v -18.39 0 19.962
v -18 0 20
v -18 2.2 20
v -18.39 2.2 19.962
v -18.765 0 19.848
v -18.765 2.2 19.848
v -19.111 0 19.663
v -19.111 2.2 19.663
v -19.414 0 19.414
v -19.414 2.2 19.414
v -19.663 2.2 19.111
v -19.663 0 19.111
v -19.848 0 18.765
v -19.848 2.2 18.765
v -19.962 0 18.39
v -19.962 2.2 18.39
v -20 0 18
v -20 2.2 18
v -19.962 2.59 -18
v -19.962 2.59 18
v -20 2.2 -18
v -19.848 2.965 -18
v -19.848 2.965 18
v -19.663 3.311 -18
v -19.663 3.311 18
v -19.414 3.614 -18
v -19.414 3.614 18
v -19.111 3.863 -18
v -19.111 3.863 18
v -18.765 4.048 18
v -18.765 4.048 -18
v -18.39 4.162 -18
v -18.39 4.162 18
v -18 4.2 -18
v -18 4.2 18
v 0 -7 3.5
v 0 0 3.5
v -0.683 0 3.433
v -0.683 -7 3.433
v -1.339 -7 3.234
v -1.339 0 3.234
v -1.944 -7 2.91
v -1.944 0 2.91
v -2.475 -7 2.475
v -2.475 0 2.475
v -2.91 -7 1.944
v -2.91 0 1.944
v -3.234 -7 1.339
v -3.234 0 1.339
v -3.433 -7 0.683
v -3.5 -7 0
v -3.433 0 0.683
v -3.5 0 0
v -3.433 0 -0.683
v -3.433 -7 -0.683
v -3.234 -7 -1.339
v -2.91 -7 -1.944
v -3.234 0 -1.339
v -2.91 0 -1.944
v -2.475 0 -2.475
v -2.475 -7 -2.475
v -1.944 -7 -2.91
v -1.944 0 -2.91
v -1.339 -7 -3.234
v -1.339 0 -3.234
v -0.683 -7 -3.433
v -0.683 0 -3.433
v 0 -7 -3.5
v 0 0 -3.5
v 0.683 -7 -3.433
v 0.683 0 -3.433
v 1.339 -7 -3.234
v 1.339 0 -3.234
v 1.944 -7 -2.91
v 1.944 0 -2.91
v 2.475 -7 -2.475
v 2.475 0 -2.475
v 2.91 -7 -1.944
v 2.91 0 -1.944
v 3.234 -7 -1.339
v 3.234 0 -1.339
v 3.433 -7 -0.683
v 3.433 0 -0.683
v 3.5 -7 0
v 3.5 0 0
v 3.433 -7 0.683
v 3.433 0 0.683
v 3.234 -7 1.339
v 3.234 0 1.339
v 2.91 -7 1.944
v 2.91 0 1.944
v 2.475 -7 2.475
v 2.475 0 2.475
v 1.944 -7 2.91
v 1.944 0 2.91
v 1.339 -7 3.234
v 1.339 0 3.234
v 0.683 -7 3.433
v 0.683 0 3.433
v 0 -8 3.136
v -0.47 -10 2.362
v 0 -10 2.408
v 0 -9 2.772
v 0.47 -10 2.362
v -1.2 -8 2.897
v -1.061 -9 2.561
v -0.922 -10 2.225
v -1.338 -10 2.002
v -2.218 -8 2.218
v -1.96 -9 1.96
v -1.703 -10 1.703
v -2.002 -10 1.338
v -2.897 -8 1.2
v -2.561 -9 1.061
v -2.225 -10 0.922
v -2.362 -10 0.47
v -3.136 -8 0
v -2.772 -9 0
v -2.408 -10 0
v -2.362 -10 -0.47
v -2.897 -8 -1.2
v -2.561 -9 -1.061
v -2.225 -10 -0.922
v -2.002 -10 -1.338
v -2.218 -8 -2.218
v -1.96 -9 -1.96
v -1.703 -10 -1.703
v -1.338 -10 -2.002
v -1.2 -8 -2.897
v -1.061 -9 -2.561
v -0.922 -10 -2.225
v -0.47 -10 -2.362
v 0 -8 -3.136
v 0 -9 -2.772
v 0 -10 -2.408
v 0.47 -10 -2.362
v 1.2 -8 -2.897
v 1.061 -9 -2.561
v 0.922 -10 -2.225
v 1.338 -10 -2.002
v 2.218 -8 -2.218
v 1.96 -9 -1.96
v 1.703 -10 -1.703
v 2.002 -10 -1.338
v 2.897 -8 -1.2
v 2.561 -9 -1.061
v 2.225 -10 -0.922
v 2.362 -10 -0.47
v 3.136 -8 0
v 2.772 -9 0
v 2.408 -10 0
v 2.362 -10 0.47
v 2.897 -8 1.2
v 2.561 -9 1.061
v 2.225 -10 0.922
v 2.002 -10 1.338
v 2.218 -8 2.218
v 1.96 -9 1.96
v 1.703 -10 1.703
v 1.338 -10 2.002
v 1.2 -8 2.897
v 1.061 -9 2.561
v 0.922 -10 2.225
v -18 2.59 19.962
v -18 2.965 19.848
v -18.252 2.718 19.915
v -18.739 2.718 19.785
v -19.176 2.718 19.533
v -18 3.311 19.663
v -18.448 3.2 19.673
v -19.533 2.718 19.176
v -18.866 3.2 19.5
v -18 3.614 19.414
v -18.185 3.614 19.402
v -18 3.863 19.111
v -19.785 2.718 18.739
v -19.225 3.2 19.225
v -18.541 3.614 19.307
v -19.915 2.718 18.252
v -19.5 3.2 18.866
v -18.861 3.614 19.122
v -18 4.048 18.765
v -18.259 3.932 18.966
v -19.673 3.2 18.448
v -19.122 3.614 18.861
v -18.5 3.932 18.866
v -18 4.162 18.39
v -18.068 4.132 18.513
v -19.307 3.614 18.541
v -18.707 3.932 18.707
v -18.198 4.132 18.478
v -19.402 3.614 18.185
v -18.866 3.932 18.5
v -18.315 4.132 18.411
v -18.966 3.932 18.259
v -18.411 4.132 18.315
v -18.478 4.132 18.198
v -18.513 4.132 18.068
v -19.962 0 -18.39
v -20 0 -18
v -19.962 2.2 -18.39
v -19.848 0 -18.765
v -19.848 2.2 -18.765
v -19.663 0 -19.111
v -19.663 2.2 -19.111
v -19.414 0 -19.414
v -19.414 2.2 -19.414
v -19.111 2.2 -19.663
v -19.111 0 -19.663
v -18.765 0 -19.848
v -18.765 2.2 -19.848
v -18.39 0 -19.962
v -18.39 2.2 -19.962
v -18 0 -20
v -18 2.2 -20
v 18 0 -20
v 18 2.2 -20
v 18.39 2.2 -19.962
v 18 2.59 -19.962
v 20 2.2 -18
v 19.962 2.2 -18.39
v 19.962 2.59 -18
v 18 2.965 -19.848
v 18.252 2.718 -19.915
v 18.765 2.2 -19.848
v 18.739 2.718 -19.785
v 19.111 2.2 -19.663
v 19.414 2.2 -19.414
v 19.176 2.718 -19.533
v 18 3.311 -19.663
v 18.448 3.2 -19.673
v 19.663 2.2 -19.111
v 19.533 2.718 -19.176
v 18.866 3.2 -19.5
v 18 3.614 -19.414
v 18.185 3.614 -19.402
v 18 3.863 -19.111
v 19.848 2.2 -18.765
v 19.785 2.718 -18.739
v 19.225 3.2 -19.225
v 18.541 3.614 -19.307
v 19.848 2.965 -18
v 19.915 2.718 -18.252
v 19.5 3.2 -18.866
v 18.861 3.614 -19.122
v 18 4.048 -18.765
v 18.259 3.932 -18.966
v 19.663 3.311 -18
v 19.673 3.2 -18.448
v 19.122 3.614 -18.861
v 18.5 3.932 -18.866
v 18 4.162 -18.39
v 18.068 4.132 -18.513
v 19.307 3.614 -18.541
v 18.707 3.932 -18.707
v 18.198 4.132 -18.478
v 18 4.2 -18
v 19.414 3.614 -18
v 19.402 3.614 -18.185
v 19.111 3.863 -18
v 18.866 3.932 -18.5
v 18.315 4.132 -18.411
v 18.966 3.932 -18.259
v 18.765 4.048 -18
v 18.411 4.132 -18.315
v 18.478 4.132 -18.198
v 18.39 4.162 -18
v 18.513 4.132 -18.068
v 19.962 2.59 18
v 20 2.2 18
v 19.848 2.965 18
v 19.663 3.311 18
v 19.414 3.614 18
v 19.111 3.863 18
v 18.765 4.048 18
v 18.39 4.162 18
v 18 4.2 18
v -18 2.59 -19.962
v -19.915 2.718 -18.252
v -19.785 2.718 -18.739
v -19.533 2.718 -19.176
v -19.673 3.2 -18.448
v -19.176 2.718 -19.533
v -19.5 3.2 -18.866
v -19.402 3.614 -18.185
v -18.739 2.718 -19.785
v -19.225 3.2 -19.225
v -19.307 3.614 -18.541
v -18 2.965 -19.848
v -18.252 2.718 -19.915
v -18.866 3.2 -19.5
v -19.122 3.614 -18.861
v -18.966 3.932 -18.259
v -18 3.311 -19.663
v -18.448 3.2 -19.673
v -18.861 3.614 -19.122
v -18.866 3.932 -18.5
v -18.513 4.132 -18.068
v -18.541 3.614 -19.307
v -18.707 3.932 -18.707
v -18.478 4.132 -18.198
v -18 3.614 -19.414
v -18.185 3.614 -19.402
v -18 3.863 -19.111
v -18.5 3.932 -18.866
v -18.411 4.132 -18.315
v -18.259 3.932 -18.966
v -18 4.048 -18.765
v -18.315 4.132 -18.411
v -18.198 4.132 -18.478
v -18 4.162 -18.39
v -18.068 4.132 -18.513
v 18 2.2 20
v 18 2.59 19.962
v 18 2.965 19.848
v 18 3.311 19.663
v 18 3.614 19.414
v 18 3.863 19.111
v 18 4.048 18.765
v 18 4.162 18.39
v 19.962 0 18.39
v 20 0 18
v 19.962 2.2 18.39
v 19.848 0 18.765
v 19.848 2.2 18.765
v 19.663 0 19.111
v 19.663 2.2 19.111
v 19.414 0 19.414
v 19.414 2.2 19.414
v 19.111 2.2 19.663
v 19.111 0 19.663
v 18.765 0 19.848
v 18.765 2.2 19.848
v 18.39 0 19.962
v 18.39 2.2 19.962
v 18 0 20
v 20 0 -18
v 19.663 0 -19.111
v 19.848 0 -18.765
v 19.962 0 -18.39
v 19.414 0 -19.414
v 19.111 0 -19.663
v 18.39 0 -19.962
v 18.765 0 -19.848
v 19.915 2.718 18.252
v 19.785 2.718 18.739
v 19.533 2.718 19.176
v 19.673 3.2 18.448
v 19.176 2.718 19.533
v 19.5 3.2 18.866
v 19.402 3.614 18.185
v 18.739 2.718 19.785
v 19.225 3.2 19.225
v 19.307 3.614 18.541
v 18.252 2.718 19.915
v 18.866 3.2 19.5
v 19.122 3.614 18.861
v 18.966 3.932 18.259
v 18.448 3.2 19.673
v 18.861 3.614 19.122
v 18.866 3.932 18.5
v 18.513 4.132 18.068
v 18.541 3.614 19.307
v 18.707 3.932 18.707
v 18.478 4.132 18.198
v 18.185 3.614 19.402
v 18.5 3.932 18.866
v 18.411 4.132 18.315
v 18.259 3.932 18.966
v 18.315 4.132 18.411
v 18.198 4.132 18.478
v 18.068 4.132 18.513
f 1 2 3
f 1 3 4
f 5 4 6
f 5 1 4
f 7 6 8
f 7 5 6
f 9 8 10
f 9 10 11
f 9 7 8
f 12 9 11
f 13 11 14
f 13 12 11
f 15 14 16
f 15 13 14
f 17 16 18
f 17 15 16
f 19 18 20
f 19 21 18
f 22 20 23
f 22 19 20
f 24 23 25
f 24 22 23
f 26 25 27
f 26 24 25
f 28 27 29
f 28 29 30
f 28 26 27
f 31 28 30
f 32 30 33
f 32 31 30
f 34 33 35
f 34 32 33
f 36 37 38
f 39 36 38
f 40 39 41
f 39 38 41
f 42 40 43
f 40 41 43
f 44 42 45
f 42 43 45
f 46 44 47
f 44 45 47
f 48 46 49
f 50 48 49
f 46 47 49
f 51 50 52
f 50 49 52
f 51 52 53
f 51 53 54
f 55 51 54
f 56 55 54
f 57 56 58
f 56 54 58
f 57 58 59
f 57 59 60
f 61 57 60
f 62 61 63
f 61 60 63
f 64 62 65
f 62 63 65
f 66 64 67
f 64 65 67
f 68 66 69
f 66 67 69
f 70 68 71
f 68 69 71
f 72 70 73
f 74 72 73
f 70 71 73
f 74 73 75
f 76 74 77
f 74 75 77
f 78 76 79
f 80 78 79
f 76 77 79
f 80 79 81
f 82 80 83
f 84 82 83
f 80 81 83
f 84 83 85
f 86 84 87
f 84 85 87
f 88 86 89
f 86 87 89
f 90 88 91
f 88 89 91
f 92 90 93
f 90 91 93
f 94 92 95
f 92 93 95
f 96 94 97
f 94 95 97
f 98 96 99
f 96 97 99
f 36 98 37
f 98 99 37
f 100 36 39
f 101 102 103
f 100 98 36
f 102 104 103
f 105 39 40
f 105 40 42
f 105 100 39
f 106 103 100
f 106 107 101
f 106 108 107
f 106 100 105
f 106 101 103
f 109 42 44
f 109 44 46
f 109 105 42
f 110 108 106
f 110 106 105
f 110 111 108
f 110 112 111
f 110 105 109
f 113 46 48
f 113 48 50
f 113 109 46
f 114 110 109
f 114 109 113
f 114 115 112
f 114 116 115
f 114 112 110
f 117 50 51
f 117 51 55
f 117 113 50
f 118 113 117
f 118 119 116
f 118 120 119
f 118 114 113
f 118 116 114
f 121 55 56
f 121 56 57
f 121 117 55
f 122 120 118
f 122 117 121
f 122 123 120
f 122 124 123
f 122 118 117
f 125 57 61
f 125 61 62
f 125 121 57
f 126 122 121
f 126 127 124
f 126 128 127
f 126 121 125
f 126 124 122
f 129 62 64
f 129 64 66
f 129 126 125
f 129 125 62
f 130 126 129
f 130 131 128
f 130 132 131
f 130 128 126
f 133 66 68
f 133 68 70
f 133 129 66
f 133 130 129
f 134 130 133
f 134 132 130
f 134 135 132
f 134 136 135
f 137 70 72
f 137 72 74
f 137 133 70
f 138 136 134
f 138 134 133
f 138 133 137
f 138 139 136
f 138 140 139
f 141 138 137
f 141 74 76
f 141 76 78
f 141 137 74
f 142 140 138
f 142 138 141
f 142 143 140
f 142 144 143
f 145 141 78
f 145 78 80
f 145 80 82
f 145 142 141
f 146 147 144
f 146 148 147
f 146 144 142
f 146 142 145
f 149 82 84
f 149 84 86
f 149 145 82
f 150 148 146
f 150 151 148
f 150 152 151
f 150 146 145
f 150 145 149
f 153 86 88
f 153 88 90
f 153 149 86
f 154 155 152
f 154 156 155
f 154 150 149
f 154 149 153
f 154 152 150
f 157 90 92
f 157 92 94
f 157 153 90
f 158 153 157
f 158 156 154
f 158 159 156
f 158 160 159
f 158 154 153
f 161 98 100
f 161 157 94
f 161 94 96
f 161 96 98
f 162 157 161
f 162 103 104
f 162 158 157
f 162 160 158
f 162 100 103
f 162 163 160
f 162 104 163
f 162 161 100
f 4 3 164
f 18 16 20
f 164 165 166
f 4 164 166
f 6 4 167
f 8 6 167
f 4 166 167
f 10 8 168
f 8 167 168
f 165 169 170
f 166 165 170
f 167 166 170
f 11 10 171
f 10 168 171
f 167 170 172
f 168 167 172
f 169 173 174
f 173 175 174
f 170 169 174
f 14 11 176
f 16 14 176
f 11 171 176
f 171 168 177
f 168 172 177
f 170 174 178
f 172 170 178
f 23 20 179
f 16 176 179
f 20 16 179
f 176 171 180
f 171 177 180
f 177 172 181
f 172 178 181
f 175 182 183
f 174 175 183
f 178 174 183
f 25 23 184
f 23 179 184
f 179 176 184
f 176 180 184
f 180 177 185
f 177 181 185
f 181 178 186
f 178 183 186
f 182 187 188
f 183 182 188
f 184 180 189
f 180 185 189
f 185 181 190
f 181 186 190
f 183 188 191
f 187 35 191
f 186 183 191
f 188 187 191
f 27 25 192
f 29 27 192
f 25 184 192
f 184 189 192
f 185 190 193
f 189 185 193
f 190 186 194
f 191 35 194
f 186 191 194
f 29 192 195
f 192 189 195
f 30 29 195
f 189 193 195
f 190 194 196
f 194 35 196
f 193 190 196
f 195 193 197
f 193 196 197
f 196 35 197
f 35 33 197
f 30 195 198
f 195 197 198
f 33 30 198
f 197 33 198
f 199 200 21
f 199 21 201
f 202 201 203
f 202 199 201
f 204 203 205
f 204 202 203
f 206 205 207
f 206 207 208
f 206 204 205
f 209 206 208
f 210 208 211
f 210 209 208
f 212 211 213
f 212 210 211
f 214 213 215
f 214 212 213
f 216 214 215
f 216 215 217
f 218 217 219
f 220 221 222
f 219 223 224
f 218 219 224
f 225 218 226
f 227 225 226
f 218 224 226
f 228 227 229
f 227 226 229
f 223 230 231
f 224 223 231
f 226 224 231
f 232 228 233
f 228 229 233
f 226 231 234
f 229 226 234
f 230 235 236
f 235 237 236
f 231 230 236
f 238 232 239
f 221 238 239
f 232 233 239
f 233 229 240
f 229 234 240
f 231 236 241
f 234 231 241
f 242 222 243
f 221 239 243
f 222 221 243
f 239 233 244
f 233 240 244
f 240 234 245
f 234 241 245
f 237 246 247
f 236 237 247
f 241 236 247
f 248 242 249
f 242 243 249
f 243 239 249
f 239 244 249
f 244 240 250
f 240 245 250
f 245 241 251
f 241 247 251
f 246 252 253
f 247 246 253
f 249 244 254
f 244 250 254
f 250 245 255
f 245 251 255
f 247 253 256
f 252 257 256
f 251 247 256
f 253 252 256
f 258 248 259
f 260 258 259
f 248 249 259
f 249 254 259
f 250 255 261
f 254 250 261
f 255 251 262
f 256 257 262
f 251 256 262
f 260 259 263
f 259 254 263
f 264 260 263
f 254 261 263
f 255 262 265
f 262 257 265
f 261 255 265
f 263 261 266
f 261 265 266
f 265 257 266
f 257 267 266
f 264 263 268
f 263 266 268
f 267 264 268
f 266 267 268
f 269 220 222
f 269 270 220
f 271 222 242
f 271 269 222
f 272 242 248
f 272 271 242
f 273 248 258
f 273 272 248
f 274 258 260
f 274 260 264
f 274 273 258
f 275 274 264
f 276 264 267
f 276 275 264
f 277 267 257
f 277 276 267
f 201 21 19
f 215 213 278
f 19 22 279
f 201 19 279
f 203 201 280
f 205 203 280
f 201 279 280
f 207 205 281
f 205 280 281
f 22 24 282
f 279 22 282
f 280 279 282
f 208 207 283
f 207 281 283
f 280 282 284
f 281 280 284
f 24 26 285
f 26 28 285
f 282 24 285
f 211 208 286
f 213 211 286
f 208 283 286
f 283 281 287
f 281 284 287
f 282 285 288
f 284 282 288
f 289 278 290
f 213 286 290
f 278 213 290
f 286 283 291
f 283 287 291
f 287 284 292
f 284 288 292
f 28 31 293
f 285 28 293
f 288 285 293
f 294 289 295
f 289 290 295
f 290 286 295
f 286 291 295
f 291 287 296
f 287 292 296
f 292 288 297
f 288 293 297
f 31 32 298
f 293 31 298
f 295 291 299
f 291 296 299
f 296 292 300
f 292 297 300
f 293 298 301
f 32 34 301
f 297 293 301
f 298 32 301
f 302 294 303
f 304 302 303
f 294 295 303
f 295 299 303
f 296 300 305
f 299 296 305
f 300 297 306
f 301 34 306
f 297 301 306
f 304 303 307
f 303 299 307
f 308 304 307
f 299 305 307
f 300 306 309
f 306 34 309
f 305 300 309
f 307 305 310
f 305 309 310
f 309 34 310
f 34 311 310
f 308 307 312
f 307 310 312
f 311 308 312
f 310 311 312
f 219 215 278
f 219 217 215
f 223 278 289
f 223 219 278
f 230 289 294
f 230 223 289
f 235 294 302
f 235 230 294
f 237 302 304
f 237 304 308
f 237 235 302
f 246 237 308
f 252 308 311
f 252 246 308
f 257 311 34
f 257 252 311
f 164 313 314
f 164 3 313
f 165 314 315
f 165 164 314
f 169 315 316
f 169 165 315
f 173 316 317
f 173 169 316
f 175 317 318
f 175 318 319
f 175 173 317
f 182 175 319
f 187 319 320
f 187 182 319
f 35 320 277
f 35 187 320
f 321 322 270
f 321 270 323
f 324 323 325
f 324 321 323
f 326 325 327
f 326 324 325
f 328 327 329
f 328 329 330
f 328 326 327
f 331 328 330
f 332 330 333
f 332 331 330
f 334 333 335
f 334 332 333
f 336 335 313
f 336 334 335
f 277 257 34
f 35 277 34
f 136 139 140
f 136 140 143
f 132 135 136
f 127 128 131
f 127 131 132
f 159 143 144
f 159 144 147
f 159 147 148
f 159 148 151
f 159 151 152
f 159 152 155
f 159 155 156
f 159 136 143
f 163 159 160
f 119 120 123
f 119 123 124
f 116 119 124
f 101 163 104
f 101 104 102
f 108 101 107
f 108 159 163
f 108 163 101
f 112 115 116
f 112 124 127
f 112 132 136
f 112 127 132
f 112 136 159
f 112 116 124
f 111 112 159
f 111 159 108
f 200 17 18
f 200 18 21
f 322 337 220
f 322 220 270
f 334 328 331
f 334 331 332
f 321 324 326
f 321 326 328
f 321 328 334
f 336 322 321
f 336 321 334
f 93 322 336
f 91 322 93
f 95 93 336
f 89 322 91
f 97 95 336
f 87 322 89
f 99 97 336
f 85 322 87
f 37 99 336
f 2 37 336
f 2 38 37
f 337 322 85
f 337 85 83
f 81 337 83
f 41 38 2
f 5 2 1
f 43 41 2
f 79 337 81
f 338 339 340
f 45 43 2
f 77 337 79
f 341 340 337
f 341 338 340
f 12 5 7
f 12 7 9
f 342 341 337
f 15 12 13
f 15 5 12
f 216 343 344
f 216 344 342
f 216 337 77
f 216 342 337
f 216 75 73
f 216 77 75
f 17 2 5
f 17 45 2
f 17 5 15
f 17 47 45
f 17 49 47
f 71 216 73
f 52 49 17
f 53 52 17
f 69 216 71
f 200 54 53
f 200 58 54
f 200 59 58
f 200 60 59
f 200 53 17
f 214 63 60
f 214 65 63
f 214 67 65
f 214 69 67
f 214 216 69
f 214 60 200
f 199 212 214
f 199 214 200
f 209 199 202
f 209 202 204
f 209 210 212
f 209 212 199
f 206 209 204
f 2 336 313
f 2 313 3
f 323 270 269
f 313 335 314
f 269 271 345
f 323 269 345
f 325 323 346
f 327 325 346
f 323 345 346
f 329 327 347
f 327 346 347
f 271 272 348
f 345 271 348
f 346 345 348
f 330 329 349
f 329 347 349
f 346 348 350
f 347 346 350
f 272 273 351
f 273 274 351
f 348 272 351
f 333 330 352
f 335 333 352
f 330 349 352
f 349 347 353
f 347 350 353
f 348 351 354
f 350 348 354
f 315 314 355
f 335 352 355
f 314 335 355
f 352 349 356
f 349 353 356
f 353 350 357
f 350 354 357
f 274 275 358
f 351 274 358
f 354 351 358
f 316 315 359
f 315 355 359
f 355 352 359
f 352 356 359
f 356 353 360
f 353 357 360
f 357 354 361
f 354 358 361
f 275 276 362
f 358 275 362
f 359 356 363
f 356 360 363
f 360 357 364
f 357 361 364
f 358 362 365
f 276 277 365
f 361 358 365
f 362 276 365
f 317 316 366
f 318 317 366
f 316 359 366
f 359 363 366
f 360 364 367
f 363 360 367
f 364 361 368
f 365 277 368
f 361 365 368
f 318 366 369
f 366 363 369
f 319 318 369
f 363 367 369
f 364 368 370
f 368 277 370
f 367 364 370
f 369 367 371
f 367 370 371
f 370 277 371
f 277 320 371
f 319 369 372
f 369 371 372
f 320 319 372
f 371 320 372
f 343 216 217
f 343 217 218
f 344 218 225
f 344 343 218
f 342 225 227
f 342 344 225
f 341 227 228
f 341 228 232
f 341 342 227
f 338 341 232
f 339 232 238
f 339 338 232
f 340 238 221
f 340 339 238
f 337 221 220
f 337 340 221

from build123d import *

# Parameters (mm, degrees)
AUFSATZ_LINEAR_AUSTRAGEN1_DEPTH = 4.2
VERRUNDUNG1_R                   = 2
SKIZZE2_R                       = 3.5
AUFSATZ_LINEAR_AUSTRAGEN2_DEPTH = 10
FASE1_SIZE                      = 3
FASE1_SIZE2                     = 1.091910703


with BuildPart() as part:
    # Skizze1 → Aufsatz-Linear austragen1 (new body)
    with BuildSketch(Plane(origin=(0, 0, 0), x_dir=(1, 0, 0), z_dir=(0, 1, 0))):
        with BuildLine():
            Line((-20, -18), (-20, 18))
            ThreePointArc((-20, 18), (-19.414213562, 19.414213562), (-18, 20))
            Line((-18, 20), (18, 20))
            ThreePointArc((18, 20), (19.414213562, 19.414213562), (20, 18))
            Line((20, 18), (20, -18))
            ThreePointArc((20, -18), (19.414213562, -19.414213562), (18, -20))
            Line((18, -20), (-18, -20))
            ThreePointArc((-18, -20), (-19.414213562, -19.414213562), (-20, -18))
        make_face()
    extrude(amount=AUFSATZ_LINEAR_AUSTRAGEN1_DEPTH)

    # Verrundung1
    verrundung1_edges = [part.edges().sort_by_distance(p)[0] for p in [
        (-19.414213562, 4.2, 19.414213562),
        (0, 4.2, 20),
        (19.414213562, 4.2, 19.414213562),
        (20, 4.2, 0),
        (19.414213562, 4.2, -19.414213562),
        (0, 4.2, -20),
        (-19.414213562, 4.2, -19.414213562),
        (-20, 4.2, 0),
    ]]
    fillet(verrundung1_edges, radius=VERRUNDUNG1_R)

    # Skizze2 → Aufsatz-Linear austragen2 (add)
    with BuildSketch(Plane.XZ):
        with Locations(Location((0, 0, 0), (0, 0, 90))):
            Circle(SKIZZE2_R)
    extrude(amount=AUFSATZ_LINEAR_AUSTRAGEN2_DEPTH)

    # Fase1
    fase1_edges = [part.edges().sort_by_distance(p)[0] for p in [
        (0, -10, -3.5),
    ]]
    fase1_side = [part.faces().sort_by_distance(p)[0] for p in [
        (0, -5, -3.5),
    ]]
    chamfer(fase1_edges, length=FASE1_SIZE, length2=FASE1_SIZE2, reference=fase1_side[0])


solid = part.part
